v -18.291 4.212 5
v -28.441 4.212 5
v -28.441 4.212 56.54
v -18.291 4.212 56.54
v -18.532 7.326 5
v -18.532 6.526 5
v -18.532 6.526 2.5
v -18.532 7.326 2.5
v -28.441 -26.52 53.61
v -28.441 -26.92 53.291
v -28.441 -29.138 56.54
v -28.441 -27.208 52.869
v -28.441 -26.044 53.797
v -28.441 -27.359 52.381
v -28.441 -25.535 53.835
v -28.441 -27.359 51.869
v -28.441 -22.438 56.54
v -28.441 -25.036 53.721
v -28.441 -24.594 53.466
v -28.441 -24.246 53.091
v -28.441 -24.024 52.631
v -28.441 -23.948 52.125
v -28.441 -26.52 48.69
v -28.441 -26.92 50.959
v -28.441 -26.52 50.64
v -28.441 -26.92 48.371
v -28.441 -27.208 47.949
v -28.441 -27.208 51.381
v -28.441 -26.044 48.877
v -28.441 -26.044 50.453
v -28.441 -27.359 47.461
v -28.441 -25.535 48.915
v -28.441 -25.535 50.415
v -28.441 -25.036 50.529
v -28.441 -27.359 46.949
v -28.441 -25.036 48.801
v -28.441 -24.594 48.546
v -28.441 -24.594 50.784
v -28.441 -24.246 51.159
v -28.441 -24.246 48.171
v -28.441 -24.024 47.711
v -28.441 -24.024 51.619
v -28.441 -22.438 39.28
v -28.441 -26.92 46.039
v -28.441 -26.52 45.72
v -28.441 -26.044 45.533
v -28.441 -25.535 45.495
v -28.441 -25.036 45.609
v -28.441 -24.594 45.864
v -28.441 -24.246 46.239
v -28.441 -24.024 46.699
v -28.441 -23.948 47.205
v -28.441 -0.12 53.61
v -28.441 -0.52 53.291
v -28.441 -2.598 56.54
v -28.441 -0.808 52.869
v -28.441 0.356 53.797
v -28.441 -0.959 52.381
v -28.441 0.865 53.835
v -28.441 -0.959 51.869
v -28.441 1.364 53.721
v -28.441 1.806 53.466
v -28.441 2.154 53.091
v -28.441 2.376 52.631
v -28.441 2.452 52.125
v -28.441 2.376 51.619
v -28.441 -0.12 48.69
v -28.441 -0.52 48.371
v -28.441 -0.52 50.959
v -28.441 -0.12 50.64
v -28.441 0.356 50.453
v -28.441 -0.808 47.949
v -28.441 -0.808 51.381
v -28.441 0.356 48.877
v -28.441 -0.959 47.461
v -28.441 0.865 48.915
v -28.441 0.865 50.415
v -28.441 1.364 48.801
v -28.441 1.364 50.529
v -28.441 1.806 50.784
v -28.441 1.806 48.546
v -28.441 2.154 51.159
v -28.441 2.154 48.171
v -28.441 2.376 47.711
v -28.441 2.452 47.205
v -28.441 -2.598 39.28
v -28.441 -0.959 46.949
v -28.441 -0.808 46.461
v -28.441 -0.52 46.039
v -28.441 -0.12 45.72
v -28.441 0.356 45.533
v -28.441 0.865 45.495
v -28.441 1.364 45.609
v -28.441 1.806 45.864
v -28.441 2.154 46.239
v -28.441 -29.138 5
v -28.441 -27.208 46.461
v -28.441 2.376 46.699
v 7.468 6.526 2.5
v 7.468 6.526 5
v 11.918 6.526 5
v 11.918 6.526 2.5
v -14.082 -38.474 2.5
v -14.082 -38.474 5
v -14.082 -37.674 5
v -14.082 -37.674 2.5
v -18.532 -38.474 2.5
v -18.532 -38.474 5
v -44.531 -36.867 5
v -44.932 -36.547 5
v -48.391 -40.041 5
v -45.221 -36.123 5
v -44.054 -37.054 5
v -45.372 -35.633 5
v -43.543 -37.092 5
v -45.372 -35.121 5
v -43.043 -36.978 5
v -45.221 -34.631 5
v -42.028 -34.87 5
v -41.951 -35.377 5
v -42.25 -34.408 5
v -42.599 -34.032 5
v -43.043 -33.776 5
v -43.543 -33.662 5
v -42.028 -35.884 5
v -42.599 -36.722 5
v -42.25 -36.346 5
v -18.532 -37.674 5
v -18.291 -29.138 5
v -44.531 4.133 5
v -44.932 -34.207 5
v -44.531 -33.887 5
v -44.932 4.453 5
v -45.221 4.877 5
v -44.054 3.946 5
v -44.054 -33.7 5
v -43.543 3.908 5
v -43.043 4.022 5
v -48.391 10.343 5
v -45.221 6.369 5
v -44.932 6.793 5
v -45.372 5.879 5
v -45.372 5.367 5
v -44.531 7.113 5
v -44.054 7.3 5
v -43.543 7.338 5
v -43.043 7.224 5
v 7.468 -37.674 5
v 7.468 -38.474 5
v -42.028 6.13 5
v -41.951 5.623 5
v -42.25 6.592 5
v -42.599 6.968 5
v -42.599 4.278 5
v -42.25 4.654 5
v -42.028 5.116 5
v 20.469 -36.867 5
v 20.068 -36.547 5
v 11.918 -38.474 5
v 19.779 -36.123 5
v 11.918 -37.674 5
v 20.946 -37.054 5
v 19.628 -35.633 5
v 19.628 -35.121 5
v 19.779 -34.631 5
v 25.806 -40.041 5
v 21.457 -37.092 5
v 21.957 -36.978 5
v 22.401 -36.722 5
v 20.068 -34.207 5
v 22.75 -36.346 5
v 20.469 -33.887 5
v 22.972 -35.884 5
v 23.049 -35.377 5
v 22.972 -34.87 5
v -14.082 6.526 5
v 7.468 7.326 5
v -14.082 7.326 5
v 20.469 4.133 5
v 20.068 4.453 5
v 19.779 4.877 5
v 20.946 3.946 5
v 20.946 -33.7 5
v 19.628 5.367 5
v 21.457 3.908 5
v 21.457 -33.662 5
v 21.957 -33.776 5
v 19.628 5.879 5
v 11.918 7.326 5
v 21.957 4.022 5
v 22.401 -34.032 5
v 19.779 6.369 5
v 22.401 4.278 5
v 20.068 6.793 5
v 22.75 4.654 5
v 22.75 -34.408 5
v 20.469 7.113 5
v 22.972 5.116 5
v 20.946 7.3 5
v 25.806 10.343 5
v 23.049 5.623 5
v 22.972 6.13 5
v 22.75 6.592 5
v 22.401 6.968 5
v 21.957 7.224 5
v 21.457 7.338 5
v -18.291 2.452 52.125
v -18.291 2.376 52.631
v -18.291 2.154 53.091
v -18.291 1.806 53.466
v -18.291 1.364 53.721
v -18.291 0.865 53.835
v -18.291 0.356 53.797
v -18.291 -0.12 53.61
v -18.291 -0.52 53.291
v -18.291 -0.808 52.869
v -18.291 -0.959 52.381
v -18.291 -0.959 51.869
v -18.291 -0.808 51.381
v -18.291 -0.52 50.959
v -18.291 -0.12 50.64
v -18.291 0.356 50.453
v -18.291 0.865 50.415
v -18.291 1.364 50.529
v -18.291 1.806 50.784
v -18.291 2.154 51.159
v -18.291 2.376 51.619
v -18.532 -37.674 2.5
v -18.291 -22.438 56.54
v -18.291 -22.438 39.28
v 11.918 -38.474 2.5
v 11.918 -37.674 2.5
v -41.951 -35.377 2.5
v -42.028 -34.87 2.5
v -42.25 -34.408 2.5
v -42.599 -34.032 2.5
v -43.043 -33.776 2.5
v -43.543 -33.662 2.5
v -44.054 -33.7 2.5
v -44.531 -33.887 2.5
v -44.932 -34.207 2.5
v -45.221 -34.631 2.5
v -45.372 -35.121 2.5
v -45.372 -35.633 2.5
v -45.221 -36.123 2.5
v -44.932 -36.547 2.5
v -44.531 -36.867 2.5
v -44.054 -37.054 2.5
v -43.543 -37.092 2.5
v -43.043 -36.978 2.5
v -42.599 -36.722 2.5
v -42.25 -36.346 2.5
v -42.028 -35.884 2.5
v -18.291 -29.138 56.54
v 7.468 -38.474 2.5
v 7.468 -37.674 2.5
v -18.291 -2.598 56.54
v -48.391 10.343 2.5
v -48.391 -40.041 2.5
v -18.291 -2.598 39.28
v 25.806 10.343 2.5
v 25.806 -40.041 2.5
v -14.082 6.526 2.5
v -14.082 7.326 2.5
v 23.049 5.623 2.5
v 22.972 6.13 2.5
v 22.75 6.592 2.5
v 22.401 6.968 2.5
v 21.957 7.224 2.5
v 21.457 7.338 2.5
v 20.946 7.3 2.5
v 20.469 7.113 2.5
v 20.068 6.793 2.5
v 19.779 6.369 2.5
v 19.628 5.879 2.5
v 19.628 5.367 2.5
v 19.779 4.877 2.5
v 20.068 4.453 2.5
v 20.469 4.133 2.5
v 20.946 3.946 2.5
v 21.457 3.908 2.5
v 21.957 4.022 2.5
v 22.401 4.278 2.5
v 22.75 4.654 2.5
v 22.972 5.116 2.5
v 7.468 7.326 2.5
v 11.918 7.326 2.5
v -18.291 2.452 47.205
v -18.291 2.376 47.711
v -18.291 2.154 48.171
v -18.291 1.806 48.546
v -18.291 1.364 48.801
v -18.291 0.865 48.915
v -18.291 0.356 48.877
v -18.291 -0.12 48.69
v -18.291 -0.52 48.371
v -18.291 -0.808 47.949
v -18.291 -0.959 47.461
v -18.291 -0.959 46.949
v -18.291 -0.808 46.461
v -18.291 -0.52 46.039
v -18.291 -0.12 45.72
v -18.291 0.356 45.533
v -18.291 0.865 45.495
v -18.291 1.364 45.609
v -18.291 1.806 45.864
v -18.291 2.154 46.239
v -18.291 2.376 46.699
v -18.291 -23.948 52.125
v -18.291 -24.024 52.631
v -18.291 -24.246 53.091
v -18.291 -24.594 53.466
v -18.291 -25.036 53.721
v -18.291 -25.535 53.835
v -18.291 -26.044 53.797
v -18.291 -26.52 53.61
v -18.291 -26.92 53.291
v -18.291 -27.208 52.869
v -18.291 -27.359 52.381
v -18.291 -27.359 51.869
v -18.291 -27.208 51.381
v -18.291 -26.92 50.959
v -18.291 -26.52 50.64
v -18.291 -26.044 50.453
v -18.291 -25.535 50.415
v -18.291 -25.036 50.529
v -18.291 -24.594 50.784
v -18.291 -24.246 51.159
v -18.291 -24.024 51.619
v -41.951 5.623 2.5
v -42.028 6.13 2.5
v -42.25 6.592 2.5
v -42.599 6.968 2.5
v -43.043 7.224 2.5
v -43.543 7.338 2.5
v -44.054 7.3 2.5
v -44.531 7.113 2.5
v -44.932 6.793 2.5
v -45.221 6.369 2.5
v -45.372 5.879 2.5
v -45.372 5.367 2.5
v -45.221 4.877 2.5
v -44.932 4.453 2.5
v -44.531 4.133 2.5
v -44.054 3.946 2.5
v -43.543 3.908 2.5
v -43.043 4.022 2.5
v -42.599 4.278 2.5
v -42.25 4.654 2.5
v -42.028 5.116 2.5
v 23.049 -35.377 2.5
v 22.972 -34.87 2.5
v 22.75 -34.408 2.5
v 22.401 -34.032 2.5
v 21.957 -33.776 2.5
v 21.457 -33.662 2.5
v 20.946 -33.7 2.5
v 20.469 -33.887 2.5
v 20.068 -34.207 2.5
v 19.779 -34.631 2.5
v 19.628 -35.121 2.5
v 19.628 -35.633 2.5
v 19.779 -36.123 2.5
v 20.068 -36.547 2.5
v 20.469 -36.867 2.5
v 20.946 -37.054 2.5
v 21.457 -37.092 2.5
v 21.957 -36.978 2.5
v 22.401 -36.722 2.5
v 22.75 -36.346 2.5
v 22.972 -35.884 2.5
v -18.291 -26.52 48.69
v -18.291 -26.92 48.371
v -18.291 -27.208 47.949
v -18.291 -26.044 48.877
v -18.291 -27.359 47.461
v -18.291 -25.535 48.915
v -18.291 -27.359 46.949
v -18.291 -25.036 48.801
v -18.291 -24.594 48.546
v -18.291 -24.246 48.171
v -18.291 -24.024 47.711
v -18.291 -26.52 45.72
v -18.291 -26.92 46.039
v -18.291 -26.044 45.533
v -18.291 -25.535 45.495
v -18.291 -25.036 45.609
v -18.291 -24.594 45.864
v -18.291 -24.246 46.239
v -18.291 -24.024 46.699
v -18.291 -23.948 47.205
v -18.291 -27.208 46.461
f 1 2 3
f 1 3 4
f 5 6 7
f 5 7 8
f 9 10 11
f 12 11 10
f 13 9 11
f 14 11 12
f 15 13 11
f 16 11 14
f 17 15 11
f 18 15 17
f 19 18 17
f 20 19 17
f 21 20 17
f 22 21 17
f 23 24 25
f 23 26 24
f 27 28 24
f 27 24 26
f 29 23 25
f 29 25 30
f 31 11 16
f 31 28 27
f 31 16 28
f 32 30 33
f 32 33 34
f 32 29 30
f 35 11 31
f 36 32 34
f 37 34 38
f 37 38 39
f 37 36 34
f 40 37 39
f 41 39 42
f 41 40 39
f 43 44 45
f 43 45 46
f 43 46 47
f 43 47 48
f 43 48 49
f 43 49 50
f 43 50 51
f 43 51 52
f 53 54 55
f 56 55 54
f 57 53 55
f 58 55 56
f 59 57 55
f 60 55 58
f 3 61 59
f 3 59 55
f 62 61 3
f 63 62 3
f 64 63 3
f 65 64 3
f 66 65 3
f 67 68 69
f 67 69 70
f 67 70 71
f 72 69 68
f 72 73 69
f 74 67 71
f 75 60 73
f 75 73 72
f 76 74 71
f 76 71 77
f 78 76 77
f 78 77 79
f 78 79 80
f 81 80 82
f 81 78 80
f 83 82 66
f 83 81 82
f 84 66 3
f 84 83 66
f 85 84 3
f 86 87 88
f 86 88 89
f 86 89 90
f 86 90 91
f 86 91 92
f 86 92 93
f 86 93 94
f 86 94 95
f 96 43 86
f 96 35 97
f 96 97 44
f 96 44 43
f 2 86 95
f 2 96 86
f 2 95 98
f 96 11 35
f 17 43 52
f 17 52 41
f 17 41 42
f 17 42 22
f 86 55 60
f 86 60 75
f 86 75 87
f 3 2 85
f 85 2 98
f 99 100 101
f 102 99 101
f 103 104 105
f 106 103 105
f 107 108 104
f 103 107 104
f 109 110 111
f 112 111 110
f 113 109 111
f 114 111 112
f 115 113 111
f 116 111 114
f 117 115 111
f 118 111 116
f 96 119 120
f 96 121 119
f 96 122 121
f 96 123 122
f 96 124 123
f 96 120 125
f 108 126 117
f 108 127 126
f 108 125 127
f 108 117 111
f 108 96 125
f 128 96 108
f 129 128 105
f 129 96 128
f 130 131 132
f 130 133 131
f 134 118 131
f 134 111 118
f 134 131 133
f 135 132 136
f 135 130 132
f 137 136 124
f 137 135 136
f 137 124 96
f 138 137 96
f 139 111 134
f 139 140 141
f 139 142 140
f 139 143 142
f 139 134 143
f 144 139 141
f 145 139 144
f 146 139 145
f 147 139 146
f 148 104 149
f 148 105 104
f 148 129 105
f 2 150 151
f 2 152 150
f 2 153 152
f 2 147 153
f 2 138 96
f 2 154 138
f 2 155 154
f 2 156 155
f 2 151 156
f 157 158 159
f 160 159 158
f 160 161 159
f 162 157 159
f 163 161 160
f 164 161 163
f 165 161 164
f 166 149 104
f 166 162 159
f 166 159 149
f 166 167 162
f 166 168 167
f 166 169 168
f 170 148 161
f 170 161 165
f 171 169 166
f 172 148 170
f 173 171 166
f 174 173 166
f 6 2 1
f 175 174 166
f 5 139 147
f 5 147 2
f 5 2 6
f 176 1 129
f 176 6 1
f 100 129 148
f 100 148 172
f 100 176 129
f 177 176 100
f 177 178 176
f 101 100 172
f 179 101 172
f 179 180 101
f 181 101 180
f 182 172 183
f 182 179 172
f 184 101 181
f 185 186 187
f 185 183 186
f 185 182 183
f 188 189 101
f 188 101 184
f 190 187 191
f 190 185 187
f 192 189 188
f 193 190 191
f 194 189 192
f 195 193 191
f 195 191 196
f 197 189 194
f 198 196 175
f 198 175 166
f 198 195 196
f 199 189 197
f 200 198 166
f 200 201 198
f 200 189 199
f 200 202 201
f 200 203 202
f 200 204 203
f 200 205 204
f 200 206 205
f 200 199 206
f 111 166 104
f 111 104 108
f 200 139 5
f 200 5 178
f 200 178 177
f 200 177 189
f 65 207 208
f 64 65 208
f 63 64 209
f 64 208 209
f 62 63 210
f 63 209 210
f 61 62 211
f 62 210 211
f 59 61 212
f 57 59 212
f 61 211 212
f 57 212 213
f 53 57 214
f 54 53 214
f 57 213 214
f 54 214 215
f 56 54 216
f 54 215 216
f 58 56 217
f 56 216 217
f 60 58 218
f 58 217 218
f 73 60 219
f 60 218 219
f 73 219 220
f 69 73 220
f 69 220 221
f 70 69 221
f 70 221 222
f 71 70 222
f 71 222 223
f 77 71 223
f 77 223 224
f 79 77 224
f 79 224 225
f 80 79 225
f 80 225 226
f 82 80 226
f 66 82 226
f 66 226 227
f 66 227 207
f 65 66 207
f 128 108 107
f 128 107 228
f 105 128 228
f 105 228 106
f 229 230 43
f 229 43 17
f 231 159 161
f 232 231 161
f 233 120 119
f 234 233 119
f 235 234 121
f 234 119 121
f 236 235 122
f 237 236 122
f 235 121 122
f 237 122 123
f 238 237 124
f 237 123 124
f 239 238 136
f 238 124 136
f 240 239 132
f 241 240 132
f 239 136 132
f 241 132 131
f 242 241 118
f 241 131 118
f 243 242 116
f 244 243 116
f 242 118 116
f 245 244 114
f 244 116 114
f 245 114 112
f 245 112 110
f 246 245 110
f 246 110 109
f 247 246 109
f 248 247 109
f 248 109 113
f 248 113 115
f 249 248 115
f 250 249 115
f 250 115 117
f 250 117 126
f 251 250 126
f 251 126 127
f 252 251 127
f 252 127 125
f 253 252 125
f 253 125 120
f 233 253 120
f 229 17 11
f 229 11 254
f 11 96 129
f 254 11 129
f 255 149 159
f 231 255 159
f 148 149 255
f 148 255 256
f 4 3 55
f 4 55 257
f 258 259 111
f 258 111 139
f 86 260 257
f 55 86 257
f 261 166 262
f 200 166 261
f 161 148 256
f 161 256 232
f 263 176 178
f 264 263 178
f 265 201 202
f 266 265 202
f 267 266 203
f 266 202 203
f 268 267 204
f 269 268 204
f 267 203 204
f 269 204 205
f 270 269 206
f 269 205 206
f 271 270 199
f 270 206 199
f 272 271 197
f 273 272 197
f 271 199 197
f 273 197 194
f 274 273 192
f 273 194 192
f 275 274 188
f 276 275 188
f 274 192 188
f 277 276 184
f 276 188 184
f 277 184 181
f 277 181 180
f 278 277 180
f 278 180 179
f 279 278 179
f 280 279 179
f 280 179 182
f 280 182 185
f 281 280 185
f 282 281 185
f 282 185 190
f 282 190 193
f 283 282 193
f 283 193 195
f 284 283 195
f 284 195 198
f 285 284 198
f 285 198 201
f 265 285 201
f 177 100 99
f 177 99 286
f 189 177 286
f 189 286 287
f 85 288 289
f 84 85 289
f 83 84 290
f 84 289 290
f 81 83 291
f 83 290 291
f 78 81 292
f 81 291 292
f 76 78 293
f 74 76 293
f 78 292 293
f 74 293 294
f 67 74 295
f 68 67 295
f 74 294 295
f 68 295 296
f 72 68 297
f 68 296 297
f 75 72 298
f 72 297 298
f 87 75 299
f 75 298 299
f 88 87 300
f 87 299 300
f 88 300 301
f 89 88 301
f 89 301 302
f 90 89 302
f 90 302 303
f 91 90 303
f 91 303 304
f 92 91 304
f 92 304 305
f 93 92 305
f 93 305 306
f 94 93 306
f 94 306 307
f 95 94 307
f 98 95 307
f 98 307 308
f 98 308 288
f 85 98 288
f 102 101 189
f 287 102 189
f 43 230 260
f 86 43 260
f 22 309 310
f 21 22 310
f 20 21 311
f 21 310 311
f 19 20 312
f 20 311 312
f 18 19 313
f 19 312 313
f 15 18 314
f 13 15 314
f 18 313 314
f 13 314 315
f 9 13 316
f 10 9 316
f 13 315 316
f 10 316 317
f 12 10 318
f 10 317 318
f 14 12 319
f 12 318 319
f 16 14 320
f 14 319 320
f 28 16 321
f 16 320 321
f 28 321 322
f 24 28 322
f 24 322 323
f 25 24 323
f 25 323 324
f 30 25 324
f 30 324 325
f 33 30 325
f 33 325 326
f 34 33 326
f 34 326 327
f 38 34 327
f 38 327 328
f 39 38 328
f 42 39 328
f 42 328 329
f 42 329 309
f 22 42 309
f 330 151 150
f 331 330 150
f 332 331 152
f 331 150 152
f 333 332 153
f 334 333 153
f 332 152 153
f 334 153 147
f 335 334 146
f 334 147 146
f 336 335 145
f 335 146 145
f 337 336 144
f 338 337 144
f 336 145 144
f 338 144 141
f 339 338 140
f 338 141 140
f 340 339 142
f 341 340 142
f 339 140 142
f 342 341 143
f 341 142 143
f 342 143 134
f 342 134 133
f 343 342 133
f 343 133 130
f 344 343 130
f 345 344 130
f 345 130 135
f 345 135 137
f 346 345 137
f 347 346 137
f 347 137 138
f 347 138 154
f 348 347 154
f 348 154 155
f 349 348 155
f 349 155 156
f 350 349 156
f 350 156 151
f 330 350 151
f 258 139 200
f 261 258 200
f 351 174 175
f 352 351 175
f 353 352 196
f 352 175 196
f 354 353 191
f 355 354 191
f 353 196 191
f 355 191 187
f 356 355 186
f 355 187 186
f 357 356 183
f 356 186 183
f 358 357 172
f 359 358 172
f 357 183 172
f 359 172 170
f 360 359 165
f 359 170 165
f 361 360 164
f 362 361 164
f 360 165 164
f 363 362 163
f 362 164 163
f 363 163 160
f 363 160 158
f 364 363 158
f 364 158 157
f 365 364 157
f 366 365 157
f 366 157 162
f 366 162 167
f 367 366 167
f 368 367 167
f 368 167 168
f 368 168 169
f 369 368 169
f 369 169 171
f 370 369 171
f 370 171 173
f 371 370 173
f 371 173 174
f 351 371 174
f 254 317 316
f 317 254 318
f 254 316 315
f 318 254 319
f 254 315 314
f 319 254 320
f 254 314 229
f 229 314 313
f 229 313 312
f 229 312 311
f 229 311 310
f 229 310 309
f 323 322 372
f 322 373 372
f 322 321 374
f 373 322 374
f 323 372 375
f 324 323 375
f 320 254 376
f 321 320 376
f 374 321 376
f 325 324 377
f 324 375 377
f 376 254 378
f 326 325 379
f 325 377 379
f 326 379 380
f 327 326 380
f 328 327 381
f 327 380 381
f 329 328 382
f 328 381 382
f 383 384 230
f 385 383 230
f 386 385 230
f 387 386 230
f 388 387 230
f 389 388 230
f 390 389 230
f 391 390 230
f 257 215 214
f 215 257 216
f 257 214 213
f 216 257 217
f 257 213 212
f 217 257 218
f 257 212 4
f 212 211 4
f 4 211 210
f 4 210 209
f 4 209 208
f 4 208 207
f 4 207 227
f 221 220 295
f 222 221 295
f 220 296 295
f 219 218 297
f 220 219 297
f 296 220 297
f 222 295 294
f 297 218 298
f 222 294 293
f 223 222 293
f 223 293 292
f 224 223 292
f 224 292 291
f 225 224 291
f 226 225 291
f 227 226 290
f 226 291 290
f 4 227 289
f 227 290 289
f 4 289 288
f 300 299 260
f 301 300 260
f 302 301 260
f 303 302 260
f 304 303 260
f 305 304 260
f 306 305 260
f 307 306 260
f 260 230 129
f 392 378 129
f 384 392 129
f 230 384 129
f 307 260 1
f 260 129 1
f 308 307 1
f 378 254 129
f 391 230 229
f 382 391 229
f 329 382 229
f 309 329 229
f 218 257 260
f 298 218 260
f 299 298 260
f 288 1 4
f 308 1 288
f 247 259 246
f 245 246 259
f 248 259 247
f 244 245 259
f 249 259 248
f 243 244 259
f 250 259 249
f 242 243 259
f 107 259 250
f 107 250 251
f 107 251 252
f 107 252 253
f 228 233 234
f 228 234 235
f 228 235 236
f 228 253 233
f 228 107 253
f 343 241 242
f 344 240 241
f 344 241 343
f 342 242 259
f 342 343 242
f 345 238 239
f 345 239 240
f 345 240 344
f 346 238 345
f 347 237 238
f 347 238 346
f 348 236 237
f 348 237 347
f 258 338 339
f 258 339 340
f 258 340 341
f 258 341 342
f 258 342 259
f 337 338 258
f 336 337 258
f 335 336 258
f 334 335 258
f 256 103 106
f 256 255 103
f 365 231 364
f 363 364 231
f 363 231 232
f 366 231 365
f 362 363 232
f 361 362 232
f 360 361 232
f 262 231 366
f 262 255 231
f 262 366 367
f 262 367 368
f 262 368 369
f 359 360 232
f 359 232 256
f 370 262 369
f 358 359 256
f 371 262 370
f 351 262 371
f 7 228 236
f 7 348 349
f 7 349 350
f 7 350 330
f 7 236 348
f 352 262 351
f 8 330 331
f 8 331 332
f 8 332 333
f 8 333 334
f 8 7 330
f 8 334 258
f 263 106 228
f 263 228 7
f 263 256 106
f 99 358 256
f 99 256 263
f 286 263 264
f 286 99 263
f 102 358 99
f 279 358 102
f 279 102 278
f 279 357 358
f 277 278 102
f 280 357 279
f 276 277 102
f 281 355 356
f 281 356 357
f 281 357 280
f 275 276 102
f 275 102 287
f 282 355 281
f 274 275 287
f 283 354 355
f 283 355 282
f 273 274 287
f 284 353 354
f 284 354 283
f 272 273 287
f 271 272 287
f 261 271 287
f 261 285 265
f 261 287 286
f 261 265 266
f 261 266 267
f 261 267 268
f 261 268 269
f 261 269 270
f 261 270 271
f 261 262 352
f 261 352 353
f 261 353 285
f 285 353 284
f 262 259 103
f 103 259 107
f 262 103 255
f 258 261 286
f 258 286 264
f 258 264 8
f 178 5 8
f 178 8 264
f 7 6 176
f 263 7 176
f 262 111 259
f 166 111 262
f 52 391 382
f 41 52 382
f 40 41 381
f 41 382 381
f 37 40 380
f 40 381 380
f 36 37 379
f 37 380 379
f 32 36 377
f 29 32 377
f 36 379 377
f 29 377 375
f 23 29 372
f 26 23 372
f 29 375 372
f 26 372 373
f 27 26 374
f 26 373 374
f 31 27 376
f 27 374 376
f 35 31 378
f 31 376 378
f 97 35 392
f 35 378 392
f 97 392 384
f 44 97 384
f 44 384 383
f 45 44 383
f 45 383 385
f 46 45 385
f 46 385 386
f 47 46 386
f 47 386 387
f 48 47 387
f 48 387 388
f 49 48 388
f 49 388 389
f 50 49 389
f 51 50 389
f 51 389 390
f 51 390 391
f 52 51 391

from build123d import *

# Parameters (mm, degrees)
F0_W      = 99.28
F0_H      = 99.28
F1_DEPTH  = 5
F2_R      = 9.975
F3_DEPTH  = 50.12
F4_R      = 6.97414
F5_DEPTH  = 45
F6_W      = 10.15
F6_H      = 33.35
F7_DEPTH  = 51.54
F8_W      = 19.84
F8_H      = 17.26
F9_DEPTH  = 30.101
F10_R     = 1.715
F11_DEPTH = 30.101
F12_W     = 99.28
F12_H     = 26.759172
F13_DEPTH = 55.121
F14_W     = 25.082288
F14_H     = 72.520828
F15_DEPTH = 55.121
F16_W     = 74.197712
F16_H     = 22.137212
F17_DEPTH = 55.121
F18_R     = 1.715
F19_DEPTH = 30.101
F20_W     = 4.45
F20_H     = 0.8
F21_DEPTH = 55.121
F22_R     = 1.72
F23_DEPTH = 55.121
F24_W     = 50.383616
F24_H     = 56.672631
F25_DEPTH = 74.198713


with BuildPart() as f1:
    # F0 (on Top) → F1 (new body)
    with BuildSketch(Plane.XY):
        with Locations((1.248532, -12.53785)):
            Rectangle(F0_W, F0_H)
    extrude(amount=F1_DEPTH)

    # F2 (on face) → F3 (join)
    with BuildSketch(Plane(origin=(0, 0, 0), x_dir=(1, 0, 0), z_dir=(0, 0, -1))):
        with Locations((0, 12.20285)):
            Circle(F2_R)
    extrude(amount=F3_DEPTH)

    # F4 (on face) → F5 (cut)
    with BuildSketch(Plane(origin=(0, 0, -50.12), x_dir=(1, 0, 0), z_dir=(0, 0, -1))):
        with Locations((0, 12.20285)):
            Circle(F4_R)
    extrude(amount=-F5_DEPTH, mode=Mode.SUBTRACT)

    # F6 (on face) → F7 (join)
    with BuildSketch(Plane.XY.offset(5)):
        with Locations((-23.366468, -12.46285)):
            Rectangle(F6_W, F6_H)
    extrude(amount=F7_DEPTH)

    # F8 (on face) → F9 (cut, through all)
    with BuildSketch(Plane.YZ.offset(-18.291468)):
        with Locations((-12.51785, 47.91)):
            Rectangle(F8_W, F8_H)
    extrude(amount=-F9_DEPTH, mode=Mode.SUBTRACT)

    # F10 (on face) → F11 (cut, through all)
    with BuildSketch(Plane.YZ.offset(-18.291468)):
        with Locations((-25.66285, 52.125)):
            Circle(F10_R)
        with Locations((-25.66285, 47.205)):
            Circle(F10_R)
    extrude(amount=-F11_DEPTH, mode=Mode.SUBTRACT)

    # F12 (on face) → F13 (cut, through all)
    with BuildSketch(Plane.XY.offset(5)):
        with Locations((1.248532, 23.722564)):
            Rectangle(F12_W, F12_H)
    extrude(amount=-F13_DEPTH, mode=Mode.SUBTRACT)

    # F14 (on face) → F15 (cut, through all)
    with BuildSketch(Plane.XY.offset(5)):
        with Locations((38.347388, -25.917436)):
            Rectangle(F14_W, F14_H)
    extrude(amount=-F15_DEPTH, mode=Mode.SUBTRACT)

    # F16 (on face) → F17 (cut, through all)
    with BuildSketch(Plane.XY.offset(5)):
        with Locations((-11.292612, -51.109244)):
            Rectangle(F16_W, F16_H)
    extrude(amount=-F17_DEPTH, mode=Mode.SUBTRACT)

    # F18 (on face) → F19 (cut, through all)
    with BuildSketch(Plane.YZ.offset(-18.291468)):
        with Locations((0.73715, 52.125)):
            Circle(F18_R)
        with Locations((0.73715, 47.205)):
            Circle(F18_R)
    extrude(amount=-F19_DEPTH, mode=Mode.SUBTRACT)

    # F20 (on face) → F21 (cut, through all)
    with BuildSketch(Plane.XY.offset(5)):
        with Locations((-16.306812, -38.074275)):
            Rectangle(F20_W, F20_H)
        with Locations((-16.306812, 6.925725)):
            Rectangle(F20_W, F20_H)
        with Locations((9.693188, -38.074275)):
            Rectangle(F20_W, F20_H)
        with Locations((9.693188, 6.925725)):
            Rectangle(F20_W, F20_H)
    extrude(amount=-F21_DEPTH, mode=Mode.SUBTRACT)

    # F22 (on face) → F23 (cut, through all)
    with BuildSketch(Plane.XY.offset(5)):
        with Locations((-43.671468, 5.622978)):
            Circle(F22_R)
        with Locations((-43.671468, -35.377022)):
            Circle(F22_R)
        with Locations((21.328532, 5.622978)):
            Circle(F22_R)
        with Locations((21.328532, -35.377022)):
            Circle(F22_R)
    extrude(amount=-F23_DEPTH, mode=Mode.SUBTRACT)

    # F24 (on face) → F25 (cut, through all)
    with BuildSketch(Plane.YZ.offset(25.806244)):
        with Locations((-14.84883, -25.836315)):
            Rectangle(F24_W, F24_H)
    extrude(amount=-F25_DEPTH, mode=Mode.SUBTRACT)


solid = f1.part
